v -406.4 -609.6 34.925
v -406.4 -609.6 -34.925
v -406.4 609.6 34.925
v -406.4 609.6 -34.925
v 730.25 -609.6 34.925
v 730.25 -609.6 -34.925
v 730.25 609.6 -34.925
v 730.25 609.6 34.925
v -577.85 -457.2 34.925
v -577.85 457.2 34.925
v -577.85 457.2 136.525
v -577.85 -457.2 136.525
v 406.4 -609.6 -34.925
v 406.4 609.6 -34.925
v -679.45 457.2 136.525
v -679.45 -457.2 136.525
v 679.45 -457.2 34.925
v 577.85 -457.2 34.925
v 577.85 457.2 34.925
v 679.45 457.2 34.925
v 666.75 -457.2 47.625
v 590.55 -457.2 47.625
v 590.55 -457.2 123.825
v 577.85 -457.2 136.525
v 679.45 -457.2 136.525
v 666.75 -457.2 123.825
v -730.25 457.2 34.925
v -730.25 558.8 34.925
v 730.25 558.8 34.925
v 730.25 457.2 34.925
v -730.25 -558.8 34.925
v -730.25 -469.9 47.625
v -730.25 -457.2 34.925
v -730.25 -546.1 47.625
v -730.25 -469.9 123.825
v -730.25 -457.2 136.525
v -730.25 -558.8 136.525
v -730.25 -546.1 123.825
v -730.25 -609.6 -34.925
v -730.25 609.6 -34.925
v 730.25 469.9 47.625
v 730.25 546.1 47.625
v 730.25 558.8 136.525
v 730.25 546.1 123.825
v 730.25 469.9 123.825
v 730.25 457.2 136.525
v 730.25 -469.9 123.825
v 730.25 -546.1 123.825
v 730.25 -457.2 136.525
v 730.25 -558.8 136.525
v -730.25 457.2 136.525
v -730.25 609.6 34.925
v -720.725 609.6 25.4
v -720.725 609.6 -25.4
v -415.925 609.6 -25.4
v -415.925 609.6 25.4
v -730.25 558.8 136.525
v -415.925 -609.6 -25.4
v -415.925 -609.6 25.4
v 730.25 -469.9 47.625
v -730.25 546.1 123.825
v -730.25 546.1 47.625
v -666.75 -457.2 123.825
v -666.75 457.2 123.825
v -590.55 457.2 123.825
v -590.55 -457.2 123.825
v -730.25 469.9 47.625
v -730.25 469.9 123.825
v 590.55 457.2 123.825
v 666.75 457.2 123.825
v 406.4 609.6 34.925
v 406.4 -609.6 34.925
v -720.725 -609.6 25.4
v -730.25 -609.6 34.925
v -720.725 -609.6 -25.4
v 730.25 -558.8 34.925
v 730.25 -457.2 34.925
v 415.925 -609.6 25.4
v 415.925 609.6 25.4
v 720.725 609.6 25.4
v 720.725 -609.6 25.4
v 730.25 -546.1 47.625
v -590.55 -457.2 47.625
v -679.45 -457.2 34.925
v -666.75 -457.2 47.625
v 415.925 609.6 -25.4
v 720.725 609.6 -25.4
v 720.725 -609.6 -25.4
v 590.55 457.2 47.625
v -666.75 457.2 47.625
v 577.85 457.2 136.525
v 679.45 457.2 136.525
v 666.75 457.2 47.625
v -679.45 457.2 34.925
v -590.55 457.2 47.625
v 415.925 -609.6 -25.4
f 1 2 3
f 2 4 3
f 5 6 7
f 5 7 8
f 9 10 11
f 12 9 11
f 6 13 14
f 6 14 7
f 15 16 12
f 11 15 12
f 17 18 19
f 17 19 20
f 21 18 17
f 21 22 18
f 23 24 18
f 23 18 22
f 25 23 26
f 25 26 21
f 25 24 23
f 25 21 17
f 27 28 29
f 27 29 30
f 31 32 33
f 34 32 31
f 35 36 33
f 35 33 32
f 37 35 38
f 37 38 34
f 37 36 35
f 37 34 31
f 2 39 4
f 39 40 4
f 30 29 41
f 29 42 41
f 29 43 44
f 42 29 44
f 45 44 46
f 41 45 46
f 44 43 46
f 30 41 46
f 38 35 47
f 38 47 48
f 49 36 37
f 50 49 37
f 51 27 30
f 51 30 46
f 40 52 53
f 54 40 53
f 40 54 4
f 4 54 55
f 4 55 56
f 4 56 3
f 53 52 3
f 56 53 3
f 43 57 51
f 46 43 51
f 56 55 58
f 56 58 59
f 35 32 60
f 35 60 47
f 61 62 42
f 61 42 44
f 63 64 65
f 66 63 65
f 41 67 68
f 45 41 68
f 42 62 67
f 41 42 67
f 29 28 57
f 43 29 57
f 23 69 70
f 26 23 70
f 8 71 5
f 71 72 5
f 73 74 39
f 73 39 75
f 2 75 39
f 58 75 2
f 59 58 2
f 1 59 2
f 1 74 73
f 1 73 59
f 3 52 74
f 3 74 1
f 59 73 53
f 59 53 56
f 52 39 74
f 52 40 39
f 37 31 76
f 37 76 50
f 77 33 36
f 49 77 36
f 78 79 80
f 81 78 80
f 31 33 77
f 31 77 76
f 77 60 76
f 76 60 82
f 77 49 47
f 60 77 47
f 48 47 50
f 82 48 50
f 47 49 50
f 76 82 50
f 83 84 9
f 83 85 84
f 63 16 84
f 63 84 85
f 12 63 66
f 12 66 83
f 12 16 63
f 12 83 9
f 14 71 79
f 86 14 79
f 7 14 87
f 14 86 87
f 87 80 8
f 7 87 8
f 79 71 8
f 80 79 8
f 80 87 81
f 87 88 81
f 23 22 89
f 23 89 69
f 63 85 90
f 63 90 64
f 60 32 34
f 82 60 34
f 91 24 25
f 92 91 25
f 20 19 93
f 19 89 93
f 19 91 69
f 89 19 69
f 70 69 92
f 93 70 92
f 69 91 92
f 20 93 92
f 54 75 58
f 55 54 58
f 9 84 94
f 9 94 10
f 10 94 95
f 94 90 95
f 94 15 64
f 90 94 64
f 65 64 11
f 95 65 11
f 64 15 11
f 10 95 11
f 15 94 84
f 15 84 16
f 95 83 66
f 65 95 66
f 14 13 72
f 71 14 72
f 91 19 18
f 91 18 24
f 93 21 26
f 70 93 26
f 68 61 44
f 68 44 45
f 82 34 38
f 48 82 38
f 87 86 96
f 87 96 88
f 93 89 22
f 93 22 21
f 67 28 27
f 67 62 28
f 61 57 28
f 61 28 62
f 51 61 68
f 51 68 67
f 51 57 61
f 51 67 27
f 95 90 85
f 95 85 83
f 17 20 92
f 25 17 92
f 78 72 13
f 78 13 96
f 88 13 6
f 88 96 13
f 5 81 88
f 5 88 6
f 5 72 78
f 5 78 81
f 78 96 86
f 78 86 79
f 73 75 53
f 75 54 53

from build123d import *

# Parameters (mm, degrees)
F0_W     = 323.85
F0_H     = 69.85
F0_W_2   = 304.8
F0_H_2   = 50.8
F1_DEPTH = 609.6
F2_W     = 101.6
F2_H     = 101.6
F2_W_2   = 76.2
F2_H_2   = 76.2
F3_DEPTH = 1460.5
F4_W     = 101.6
F4_H     = 101.6
F4_W_2   = 76.2
F4_H_2   = 76.2
F5_DEPTH = 914.4


with BuildPart() as f1:
    # F0 (on Front) → F1 (new body, symmetric)
    with BuildSketch(Plane.XZ):
        with Locations((-568.325, 0)):
            Rectangle(F0_W, F0_H)
        with Locations((-568.325, 0)):
            Rectangle(F0_W_2, F0_H_2, mode=Mode.SUBTRACT)
        with Locations((568.325, 0)):
            Rectangle(F0_W, F0_H)
        with Locations((568.325, 0)):
            Rectangle(F0_W_2, F0_H_2, mode=Mode.SUBTRACT)
    extrude(amount=F1_DEPTH, both=True)


with BuildPart() as f3:
    # F2 (on face) → F3 (new body)
    with BuildSketch(Plane(origin=(-730.25, 0, 0), x_dir=(0, -1, 0), z_dir=(-1, 0, 0))):
        with Locations((508, 85.725)):
            Rectangle(F2_W, F2_H)
        with Locations((508, 85.725)):
            Rectangle(F2_W_2, F2_H_2, mode=Mode.SUBTRACT)
        with Locations((-508, 85.725)):
            Rectangle(F2_W, F2_H)
        with Locations((-508, 85.725)):
            Rectangle(F2_W_2, F2_H_2, mode=Mode.SUBTRACT)
    extrude(amount=-F3_DEPTH)


with BuildPart() as f5:
    # F4 (on face) → F5 (new body)
    with BuildSketch(Plane.XZ.offset(-457.2)):
        with Locations((-628.65, 85.725)):
            Rectangle(F4_W, F4_H)
        with Locations((-628.65, 85.725)):
            Rectangle(F4_W_2, F4_H_2, mode=Mode.SUBTRACT)
        with Locations((628.65, 85.725)):
            Rectangle(F4_W, F4_H)
        with Locations((628.65, 85.725)):
            Rectangle(F4_W_2, F4_H_2, mode=Mode.SUBTRACT)
    extrude(amount=F5_DEPTH)


solid = Compound([f1.part, f3.part, f5.part])
